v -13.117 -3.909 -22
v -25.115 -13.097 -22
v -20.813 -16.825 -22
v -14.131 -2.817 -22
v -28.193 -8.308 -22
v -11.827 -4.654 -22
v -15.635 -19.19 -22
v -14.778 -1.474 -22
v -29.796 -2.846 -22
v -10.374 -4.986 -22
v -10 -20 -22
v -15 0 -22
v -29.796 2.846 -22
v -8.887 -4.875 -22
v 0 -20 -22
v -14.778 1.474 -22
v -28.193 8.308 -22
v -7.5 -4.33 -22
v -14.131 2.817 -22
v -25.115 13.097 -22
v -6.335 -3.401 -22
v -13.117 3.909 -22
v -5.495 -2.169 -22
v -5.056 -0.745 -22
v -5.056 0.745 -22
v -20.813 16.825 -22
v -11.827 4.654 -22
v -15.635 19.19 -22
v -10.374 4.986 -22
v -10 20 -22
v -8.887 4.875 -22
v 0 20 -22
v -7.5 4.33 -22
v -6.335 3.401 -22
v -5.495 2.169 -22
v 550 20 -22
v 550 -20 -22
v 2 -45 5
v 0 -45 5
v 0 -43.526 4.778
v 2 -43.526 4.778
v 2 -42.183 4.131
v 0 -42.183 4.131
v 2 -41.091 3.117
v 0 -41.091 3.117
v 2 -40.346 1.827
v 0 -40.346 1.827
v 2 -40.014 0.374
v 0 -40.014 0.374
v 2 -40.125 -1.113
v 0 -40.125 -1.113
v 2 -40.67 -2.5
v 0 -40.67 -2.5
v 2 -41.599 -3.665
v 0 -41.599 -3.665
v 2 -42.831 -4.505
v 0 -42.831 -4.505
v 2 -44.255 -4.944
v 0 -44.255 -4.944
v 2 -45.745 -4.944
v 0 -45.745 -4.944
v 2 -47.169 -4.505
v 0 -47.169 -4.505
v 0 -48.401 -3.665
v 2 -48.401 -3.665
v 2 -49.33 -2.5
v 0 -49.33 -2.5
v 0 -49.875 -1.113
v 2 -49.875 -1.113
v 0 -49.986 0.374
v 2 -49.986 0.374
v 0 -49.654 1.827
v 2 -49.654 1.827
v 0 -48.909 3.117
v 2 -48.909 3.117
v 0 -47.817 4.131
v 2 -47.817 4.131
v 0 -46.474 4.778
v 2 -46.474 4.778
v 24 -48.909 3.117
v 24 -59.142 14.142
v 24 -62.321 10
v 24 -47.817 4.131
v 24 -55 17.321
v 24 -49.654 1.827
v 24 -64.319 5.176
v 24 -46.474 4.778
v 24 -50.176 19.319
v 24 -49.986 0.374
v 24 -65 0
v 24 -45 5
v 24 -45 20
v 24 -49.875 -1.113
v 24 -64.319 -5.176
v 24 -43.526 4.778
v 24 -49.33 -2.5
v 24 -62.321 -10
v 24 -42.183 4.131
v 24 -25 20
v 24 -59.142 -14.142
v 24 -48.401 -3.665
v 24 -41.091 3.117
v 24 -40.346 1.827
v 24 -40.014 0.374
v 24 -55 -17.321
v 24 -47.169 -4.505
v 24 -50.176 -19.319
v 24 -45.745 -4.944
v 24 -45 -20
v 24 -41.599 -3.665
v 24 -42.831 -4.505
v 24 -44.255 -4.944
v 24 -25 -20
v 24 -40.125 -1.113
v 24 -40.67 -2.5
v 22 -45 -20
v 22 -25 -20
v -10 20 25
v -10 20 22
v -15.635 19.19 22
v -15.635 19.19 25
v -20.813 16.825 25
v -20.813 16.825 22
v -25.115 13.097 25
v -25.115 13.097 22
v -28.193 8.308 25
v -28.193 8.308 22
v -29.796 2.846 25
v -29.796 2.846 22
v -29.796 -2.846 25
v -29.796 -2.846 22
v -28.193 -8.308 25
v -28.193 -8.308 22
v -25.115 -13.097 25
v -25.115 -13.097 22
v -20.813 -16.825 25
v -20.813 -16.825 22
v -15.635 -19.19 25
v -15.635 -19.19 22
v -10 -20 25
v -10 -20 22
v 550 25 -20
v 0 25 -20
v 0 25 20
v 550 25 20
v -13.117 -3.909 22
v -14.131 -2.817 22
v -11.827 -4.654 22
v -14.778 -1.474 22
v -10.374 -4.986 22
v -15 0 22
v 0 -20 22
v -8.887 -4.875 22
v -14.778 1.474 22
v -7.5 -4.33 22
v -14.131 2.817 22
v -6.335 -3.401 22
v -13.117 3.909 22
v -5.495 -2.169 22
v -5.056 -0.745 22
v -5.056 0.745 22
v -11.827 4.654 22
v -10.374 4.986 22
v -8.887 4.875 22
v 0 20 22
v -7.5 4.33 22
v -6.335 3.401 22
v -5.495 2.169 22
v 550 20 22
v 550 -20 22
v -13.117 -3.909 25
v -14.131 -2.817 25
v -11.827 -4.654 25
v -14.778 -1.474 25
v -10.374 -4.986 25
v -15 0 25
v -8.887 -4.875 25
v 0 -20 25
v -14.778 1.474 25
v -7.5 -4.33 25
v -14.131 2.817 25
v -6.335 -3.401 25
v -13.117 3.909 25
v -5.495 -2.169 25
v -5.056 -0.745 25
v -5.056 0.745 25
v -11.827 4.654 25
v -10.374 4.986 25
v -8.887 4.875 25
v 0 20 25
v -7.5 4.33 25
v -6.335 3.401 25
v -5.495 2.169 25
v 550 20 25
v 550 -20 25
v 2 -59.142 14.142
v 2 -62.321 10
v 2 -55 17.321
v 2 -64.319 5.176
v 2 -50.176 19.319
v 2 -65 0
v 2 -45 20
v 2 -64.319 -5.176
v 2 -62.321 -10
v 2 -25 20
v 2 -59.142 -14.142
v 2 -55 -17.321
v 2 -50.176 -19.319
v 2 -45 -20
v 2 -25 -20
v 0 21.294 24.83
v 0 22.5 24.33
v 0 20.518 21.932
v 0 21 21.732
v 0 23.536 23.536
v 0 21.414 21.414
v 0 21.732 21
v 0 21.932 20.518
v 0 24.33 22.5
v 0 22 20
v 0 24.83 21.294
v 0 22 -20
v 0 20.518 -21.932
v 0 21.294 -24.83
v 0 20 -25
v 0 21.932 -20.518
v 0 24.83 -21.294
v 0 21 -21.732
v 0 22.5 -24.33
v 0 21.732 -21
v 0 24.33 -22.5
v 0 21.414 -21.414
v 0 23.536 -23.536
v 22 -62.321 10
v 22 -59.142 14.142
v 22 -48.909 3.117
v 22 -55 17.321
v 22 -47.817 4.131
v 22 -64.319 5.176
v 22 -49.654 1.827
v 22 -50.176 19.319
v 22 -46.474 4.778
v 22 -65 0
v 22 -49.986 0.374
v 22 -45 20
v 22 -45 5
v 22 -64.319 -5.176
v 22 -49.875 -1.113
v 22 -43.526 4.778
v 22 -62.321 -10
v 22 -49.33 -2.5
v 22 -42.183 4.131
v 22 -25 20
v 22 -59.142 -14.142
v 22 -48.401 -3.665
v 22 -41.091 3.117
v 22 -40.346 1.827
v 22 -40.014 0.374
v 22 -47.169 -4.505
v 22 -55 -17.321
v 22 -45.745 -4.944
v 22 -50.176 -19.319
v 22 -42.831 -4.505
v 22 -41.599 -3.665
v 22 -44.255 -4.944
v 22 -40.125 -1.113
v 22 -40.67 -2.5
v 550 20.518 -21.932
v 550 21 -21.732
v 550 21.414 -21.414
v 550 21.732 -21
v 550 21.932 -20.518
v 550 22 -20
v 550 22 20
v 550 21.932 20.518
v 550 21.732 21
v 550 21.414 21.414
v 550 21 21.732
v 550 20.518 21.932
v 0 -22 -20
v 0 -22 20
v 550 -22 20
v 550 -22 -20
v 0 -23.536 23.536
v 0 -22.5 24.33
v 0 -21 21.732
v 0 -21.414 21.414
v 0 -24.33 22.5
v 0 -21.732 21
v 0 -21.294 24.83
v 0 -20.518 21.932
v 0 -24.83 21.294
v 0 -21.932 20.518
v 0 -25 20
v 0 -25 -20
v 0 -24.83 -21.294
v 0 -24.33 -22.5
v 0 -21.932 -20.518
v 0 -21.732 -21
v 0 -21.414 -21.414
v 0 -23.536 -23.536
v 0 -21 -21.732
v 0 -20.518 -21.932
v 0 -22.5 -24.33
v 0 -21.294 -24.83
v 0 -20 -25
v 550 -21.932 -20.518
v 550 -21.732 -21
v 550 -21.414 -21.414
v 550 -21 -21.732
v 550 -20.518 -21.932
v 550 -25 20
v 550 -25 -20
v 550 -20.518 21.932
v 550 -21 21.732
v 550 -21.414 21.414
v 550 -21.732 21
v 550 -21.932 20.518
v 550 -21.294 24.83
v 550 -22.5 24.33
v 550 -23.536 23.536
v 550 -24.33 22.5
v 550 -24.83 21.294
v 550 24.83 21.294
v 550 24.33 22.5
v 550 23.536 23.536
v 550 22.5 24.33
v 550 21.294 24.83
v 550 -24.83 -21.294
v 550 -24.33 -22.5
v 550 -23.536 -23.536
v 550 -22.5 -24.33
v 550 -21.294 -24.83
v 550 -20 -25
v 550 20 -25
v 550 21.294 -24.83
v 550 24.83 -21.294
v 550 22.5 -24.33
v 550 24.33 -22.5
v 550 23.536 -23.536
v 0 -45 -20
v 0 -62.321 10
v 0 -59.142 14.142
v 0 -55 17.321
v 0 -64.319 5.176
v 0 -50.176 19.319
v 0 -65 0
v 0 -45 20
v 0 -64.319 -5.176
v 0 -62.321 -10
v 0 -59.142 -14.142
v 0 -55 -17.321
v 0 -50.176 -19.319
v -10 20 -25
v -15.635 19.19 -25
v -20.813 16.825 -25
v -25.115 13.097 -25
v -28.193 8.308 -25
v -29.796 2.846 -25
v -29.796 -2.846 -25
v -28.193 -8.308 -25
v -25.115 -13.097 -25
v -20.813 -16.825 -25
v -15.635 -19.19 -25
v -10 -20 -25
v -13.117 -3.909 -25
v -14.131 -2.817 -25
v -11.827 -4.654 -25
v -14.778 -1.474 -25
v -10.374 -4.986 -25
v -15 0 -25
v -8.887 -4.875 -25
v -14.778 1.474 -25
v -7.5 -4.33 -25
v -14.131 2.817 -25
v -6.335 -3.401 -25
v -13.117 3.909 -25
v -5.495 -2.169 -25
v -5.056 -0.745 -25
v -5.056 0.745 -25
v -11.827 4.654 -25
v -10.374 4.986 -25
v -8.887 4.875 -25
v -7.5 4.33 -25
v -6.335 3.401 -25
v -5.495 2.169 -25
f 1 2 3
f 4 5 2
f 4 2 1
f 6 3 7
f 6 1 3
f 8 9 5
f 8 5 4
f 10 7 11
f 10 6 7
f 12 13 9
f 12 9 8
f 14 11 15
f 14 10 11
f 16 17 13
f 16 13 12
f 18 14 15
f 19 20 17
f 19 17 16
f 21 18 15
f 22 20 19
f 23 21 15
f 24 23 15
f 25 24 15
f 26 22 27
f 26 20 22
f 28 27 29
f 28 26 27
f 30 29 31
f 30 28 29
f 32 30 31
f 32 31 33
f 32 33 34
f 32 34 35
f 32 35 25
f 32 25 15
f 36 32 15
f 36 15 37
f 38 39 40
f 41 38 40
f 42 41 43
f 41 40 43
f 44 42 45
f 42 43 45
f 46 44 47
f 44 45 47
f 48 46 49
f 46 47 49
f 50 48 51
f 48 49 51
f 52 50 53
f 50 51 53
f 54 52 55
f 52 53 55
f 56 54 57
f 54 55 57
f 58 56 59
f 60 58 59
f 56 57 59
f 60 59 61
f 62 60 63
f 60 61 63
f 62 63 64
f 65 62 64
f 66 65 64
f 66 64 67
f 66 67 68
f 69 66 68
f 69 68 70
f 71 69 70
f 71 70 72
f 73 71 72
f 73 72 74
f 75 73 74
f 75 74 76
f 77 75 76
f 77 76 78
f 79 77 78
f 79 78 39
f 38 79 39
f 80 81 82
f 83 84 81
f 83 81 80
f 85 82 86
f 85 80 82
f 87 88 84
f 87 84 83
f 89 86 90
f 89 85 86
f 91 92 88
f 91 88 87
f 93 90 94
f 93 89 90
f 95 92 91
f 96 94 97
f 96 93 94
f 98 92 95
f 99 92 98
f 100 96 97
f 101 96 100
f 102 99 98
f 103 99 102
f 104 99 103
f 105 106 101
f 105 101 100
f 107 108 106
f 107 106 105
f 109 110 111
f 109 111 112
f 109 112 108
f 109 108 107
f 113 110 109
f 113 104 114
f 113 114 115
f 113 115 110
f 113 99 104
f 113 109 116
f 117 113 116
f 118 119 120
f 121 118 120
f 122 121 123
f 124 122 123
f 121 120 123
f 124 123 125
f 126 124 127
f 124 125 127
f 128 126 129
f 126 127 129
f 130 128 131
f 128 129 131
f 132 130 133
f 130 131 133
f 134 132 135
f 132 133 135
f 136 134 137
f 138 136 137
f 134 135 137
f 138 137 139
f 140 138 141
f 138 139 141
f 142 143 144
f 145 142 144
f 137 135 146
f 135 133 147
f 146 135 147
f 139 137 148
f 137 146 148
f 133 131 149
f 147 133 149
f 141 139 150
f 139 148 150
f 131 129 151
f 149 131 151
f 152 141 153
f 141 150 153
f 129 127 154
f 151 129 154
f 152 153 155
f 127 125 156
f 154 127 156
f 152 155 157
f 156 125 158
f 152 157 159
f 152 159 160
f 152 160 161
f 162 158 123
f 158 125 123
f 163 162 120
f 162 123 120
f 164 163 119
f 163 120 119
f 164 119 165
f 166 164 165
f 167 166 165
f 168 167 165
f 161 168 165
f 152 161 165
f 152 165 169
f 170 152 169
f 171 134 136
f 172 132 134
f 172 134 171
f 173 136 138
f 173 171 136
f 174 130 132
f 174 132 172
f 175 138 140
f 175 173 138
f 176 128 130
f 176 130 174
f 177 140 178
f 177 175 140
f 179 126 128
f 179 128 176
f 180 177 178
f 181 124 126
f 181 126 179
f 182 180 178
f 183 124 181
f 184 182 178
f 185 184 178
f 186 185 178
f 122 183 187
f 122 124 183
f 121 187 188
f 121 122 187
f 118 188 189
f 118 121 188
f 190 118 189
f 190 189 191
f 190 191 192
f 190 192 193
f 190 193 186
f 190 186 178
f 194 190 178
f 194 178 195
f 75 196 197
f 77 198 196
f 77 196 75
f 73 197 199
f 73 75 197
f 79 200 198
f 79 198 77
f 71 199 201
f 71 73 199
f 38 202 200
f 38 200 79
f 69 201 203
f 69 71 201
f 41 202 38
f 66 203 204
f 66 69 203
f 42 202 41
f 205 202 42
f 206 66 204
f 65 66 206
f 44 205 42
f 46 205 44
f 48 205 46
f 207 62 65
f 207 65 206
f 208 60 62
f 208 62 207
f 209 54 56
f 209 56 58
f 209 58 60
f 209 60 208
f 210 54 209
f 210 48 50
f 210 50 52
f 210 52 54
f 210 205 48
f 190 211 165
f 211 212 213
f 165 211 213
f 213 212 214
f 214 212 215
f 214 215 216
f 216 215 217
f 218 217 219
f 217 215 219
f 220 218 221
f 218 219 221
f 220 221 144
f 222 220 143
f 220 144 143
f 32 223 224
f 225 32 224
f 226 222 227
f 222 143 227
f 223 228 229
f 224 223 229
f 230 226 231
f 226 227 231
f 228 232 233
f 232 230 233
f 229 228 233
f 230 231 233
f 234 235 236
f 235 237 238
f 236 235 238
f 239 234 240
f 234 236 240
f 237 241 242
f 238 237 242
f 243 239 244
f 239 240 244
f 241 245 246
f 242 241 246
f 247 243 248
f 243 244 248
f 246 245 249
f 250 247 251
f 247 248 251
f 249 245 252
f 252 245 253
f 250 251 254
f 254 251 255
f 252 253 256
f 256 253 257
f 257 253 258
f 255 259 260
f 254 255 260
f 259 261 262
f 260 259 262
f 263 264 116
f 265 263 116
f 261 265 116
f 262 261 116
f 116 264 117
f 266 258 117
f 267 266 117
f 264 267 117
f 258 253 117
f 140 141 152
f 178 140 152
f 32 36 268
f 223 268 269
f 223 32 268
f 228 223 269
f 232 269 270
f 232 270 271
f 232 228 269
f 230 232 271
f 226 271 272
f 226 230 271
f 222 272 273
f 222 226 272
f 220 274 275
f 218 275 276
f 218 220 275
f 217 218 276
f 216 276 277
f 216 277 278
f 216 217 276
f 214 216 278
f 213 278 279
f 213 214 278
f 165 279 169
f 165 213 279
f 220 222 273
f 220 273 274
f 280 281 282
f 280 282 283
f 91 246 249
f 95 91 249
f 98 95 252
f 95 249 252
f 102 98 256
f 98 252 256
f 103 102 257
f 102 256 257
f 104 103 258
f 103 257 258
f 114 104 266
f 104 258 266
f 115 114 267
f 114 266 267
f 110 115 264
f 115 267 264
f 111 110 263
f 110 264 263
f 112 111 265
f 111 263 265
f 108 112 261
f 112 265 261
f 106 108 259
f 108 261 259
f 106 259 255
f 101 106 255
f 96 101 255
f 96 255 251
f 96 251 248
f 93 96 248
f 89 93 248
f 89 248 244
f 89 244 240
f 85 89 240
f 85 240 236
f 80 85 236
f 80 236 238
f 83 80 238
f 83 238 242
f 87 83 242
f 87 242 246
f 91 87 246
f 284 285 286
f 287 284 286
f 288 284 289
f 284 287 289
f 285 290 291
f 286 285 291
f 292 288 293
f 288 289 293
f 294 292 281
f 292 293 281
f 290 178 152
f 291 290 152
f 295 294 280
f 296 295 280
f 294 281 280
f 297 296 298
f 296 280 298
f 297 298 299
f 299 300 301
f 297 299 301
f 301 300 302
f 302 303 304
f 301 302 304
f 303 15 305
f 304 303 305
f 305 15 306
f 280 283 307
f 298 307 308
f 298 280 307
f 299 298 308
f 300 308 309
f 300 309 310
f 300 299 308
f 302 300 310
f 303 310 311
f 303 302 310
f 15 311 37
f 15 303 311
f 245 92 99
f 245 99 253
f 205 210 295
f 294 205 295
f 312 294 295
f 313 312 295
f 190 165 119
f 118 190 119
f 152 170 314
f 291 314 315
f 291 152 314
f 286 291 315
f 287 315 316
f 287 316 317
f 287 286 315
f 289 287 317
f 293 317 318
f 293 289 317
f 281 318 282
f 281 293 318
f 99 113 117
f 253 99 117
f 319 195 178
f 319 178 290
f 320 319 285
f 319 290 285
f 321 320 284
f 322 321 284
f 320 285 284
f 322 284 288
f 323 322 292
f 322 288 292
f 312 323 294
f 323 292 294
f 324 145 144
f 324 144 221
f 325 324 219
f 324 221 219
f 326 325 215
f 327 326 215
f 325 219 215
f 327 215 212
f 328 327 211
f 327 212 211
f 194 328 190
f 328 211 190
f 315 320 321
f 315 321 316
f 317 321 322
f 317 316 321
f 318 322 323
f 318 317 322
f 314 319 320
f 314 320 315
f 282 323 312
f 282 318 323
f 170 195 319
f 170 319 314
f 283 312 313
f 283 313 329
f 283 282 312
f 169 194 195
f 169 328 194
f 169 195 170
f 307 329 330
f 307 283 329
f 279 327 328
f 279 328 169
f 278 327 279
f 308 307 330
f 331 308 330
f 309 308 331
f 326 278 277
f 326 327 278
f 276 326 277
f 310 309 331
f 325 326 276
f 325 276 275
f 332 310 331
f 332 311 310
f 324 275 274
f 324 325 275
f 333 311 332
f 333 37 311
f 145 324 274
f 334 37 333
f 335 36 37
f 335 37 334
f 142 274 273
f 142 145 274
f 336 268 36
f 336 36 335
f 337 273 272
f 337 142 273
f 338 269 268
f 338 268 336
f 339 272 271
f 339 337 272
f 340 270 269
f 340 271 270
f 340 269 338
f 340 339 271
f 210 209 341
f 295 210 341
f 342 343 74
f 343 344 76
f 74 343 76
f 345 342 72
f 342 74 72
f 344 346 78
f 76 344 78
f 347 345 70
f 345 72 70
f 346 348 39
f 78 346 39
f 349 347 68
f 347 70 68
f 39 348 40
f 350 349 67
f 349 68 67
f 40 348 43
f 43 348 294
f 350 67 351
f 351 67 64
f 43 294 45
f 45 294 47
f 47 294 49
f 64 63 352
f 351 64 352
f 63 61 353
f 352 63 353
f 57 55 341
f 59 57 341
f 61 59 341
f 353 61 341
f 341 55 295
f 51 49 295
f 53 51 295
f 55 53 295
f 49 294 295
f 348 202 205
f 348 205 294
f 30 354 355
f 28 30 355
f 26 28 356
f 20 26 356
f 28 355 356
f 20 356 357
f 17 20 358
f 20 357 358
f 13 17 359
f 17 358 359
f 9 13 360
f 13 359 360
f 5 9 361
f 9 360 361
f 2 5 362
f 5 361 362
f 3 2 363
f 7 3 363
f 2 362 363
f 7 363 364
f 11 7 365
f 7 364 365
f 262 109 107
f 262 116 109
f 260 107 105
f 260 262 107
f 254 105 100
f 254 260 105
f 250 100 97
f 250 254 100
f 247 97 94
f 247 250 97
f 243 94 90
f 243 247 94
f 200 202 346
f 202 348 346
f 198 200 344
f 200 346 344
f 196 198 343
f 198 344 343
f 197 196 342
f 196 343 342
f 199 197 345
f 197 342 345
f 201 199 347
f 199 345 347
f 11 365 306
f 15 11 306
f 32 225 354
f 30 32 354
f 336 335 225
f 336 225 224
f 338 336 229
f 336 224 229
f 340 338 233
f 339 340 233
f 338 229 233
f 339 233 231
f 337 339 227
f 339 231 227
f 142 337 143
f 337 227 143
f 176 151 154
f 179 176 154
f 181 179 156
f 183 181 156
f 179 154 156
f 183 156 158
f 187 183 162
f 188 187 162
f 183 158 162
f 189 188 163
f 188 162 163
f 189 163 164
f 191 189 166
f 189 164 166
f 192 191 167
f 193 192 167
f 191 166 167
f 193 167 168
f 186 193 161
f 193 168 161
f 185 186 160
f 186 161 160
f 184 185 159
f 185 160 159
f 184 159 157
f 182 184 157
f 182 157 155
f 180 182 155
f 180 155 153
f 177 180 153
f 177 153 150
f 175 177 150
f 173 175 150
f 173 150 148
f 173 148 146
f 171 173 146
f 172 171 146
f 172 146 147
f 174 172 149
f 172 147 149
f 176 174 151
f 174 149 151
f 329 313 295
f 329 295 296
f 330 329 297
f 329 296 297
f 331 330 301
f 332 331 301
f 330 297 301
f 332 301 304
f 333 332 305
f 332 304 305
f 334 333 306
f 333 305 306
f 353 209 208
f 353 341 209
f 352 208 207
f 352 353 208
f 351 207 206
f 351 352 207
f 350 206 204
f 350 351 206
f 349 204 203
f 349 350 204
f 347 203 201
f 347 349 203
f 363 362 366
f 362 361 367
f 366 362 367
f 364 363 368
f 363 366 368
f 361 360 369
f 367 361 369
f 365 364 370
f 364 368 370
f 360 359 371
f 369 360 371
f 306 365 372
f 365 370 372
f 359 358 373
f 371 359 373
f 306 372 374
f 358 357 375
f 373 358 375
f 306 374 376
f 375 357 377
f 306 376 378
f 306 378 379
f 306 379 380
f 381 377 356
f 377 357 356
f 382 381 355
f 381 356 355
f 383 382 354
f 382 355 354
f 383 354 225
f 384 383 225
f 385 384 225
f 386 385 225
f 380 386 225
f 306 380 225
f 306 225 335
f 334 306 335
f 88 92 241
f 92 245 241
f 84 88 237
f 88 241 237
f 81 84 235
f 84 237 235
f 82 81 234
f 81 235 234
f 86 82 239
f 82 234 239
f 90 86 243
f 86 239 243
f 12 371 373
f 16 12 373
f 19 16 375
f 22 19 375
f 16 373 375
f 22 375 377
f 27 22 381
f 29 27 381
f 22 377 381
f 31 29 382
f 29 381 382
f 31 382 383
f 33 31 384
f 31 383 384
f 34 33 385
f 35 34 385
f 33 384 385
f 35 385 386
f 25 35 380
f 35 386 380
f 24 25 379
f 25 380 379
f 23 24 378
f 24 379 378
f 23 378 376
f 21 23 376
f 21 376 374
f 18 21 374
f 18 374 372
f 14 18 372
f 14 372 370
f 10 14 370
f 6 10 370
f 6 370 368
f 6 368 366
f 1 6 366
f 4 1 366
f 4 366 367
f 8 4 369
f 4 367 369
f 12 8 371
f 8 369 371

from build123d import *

# Parameters (mm, degrees)
EXTRUDE_THIN1_DEPTH   = 550
SKETCH3_R             = 5
BOSS_EXTRUDE2_DEPTH   = 3
BOSS_EXTRUDE3_START   = -47
SKETCH3_3_R           = 5
BOSS_EXTRUDE3_DEPTH   = 3
SKETCH5_W             = 2
SKETCH5_H             = 40
BOSS_EXTRUDE4_DEPTH   = 40
BOSS_EXTRUDE4_2_DEPTH = 40
FILLET1_R             = 20
FILLET2_R             = 20
SKETCH6_R             = 5
CUT_EXTRUDE2_DEPTH    = 555.391558377


with BuildPart() as part:
    # Sketch1 → Extrude-Thin1 (new body)
    with BuildSketch(Plane(origin=(0, 0, 0), x_dir=(0, 0, -1), z_dir=(1, 0, 0))):
        with BuildLine():
            Line((-25, 20), (-25, -20))
            ThreePointArc((-25, -20), (-23.535533906, -23.535533906), (-20, -25))
            Line((-20, -25), (20, -25))
            ThreePointArc((20, -25), (23.535533906, -23.535533906), (25, -20))
            Line((25, -20), (25, 20))
            ThreePointArc((25, 20), (23.535533906, 23.535533906), (20, 25))
            Line((20, 25), (-20, 25))
            ThreePointArc((-20, 25), (-23.535533906, 23.535533906), (-25, 20))
        make_face()
        with BuildLine():
            Line((-22, 20), (-22, -20))
            ThreePointArc((-22, -20), (-21.414213562, -21.414213562), (-20, -22))
            Line((-20, -22), (20, -22))
            ThreePointArc((20, -22), (21.414213562, -21.414213562), (22, -20))
            Line((22, -20), (22, 20))
            ThreePointArc((22, 20), (21.414213562, 21.414213562), (20, 22))
            Line((20, 22), (-20, 22))
            ThreePointArc((-20, 22), (-21.414213562, 21.414213562), (-22, 20))
        make_face(mode=Mode.SUBTRACT)
    extrude(amount=EXTRUDE_THIN1_DEPTH)

    # Sketch3 → Boss-Extrude2 (add)
    with BuildSketch(Plane(origin=(0, 0, -25), x_dir=(-1, 0, 0), z_dir=(0, 0, -1))):
        with BuildLine():
            Line((0, 20), (10, 20))
            ThreePointArc((10, 20), (30, 0), (10, -20))
            Line((10, -20), (0, -20))
            Line((0, -20), (0, 20))
        make_face()
        with Locations((10, 0)):
            Circle(SKETCH3_R, mode=Mode.SUBTRACT)
    extrude(amount=-BOSS_EXTRUDE2_DEPTH)

    # Sketch3<3> → Boss-Extrude3 (add)
    with BuildSketch(Plane(origin=(0, 0, -25), x_dir=(-1, 0, 0), z_dir=(0, 0, -1)).offset(BOSS_EXTRUDE3_START)):
        with BuildLine():
            Line((0, 20), (10, 20))
            ThreePointArc((10, 20), (30, 0), (10, -20))
            Line((10, -20), (0, -20))
            Line((0, -20), (0, 20))
        make_face()
        with Locations((10, 0)):
            Circle(SKETCH3_3_R, mode=Mode.SUBTRACT)
    extrude(amount=-BOSS_EXTRUDE3_DEPTH)


with BuildPart() as body_2:
    # Sketch5 → Boss-Extrude4 (new body)
    with BuildSketch(Plane(origin=(0, -25, 0), x_dir=(-1, 0, 0), z_dir=(0, -1, 0))):
        with Locations((-23, 0)):
            Rectangle(SKETCH5_W, SKETCH5_H)
    extrude(amount=BOSS_EXTRUDE4_DEPTH)

    # Fillet1
    fillet1_edges = [body_2.edges().sort_by_distance(p)[0] for p in [
        (23, -65, -20),
        (23, -65, 20),
    ]]
    fillet(fillet1_edges, radius=FILLET1_R - 0.0001)  # a hair under: the kernel refuses the full size


with BuildPart() as body_3:
    # Sketch5 → Boss-Extrude4 2 (new body)
    with BuildSketch(Plane(origin=(0, -25, 0), x_dir=(-1, 0, 0), z_dir=(0, -1, 0))):
        with Locations((-1, 0)):
            Rectangle(SKETCH5_W, SKETCH5_H)
    extrude(amount=BOSS_EXTRUDE4_2_DEPTH)

    # Fillet2
    fillet2_edges = [body_3.edges().sort_by_distance(p)[0] for p in [
        (1, -65, -20),
        (1, -65, 20),
    ]]
    fillet(fillet2_edges, radius=FILLET2_R - 0.0001)  # a hair under: the kernel refuses the full size


with BuildPart() as cut_extrude2_tool:
    # Sketch6 → Cut-Extrude2 (new, through all)
    with BuildSketch(Plane.ZY):
        with Locations((0, -45)):
            Circle(SKETCH6_R)
    extrude(amount=-CUT_EXTRUDE2_DEPTH)


with BuildPart() as body_2_1:
    add(body_2.part)

    # Cut-Extrude2: cut by cut_extrude2_tool
    add(cut_extrude2_tool.part, mode=Mode.SUBTRACT)


with BuildPart() as body_3_1:
    add(body_3.part)

    # Cut-Extrude2: cut by cut_extrude2_tool
    add(cut_extrude2_tool.part, mode=Mode.SUBTRACT)


solid = Compound([part.part, body_2_1.part, body_3_1.part])
